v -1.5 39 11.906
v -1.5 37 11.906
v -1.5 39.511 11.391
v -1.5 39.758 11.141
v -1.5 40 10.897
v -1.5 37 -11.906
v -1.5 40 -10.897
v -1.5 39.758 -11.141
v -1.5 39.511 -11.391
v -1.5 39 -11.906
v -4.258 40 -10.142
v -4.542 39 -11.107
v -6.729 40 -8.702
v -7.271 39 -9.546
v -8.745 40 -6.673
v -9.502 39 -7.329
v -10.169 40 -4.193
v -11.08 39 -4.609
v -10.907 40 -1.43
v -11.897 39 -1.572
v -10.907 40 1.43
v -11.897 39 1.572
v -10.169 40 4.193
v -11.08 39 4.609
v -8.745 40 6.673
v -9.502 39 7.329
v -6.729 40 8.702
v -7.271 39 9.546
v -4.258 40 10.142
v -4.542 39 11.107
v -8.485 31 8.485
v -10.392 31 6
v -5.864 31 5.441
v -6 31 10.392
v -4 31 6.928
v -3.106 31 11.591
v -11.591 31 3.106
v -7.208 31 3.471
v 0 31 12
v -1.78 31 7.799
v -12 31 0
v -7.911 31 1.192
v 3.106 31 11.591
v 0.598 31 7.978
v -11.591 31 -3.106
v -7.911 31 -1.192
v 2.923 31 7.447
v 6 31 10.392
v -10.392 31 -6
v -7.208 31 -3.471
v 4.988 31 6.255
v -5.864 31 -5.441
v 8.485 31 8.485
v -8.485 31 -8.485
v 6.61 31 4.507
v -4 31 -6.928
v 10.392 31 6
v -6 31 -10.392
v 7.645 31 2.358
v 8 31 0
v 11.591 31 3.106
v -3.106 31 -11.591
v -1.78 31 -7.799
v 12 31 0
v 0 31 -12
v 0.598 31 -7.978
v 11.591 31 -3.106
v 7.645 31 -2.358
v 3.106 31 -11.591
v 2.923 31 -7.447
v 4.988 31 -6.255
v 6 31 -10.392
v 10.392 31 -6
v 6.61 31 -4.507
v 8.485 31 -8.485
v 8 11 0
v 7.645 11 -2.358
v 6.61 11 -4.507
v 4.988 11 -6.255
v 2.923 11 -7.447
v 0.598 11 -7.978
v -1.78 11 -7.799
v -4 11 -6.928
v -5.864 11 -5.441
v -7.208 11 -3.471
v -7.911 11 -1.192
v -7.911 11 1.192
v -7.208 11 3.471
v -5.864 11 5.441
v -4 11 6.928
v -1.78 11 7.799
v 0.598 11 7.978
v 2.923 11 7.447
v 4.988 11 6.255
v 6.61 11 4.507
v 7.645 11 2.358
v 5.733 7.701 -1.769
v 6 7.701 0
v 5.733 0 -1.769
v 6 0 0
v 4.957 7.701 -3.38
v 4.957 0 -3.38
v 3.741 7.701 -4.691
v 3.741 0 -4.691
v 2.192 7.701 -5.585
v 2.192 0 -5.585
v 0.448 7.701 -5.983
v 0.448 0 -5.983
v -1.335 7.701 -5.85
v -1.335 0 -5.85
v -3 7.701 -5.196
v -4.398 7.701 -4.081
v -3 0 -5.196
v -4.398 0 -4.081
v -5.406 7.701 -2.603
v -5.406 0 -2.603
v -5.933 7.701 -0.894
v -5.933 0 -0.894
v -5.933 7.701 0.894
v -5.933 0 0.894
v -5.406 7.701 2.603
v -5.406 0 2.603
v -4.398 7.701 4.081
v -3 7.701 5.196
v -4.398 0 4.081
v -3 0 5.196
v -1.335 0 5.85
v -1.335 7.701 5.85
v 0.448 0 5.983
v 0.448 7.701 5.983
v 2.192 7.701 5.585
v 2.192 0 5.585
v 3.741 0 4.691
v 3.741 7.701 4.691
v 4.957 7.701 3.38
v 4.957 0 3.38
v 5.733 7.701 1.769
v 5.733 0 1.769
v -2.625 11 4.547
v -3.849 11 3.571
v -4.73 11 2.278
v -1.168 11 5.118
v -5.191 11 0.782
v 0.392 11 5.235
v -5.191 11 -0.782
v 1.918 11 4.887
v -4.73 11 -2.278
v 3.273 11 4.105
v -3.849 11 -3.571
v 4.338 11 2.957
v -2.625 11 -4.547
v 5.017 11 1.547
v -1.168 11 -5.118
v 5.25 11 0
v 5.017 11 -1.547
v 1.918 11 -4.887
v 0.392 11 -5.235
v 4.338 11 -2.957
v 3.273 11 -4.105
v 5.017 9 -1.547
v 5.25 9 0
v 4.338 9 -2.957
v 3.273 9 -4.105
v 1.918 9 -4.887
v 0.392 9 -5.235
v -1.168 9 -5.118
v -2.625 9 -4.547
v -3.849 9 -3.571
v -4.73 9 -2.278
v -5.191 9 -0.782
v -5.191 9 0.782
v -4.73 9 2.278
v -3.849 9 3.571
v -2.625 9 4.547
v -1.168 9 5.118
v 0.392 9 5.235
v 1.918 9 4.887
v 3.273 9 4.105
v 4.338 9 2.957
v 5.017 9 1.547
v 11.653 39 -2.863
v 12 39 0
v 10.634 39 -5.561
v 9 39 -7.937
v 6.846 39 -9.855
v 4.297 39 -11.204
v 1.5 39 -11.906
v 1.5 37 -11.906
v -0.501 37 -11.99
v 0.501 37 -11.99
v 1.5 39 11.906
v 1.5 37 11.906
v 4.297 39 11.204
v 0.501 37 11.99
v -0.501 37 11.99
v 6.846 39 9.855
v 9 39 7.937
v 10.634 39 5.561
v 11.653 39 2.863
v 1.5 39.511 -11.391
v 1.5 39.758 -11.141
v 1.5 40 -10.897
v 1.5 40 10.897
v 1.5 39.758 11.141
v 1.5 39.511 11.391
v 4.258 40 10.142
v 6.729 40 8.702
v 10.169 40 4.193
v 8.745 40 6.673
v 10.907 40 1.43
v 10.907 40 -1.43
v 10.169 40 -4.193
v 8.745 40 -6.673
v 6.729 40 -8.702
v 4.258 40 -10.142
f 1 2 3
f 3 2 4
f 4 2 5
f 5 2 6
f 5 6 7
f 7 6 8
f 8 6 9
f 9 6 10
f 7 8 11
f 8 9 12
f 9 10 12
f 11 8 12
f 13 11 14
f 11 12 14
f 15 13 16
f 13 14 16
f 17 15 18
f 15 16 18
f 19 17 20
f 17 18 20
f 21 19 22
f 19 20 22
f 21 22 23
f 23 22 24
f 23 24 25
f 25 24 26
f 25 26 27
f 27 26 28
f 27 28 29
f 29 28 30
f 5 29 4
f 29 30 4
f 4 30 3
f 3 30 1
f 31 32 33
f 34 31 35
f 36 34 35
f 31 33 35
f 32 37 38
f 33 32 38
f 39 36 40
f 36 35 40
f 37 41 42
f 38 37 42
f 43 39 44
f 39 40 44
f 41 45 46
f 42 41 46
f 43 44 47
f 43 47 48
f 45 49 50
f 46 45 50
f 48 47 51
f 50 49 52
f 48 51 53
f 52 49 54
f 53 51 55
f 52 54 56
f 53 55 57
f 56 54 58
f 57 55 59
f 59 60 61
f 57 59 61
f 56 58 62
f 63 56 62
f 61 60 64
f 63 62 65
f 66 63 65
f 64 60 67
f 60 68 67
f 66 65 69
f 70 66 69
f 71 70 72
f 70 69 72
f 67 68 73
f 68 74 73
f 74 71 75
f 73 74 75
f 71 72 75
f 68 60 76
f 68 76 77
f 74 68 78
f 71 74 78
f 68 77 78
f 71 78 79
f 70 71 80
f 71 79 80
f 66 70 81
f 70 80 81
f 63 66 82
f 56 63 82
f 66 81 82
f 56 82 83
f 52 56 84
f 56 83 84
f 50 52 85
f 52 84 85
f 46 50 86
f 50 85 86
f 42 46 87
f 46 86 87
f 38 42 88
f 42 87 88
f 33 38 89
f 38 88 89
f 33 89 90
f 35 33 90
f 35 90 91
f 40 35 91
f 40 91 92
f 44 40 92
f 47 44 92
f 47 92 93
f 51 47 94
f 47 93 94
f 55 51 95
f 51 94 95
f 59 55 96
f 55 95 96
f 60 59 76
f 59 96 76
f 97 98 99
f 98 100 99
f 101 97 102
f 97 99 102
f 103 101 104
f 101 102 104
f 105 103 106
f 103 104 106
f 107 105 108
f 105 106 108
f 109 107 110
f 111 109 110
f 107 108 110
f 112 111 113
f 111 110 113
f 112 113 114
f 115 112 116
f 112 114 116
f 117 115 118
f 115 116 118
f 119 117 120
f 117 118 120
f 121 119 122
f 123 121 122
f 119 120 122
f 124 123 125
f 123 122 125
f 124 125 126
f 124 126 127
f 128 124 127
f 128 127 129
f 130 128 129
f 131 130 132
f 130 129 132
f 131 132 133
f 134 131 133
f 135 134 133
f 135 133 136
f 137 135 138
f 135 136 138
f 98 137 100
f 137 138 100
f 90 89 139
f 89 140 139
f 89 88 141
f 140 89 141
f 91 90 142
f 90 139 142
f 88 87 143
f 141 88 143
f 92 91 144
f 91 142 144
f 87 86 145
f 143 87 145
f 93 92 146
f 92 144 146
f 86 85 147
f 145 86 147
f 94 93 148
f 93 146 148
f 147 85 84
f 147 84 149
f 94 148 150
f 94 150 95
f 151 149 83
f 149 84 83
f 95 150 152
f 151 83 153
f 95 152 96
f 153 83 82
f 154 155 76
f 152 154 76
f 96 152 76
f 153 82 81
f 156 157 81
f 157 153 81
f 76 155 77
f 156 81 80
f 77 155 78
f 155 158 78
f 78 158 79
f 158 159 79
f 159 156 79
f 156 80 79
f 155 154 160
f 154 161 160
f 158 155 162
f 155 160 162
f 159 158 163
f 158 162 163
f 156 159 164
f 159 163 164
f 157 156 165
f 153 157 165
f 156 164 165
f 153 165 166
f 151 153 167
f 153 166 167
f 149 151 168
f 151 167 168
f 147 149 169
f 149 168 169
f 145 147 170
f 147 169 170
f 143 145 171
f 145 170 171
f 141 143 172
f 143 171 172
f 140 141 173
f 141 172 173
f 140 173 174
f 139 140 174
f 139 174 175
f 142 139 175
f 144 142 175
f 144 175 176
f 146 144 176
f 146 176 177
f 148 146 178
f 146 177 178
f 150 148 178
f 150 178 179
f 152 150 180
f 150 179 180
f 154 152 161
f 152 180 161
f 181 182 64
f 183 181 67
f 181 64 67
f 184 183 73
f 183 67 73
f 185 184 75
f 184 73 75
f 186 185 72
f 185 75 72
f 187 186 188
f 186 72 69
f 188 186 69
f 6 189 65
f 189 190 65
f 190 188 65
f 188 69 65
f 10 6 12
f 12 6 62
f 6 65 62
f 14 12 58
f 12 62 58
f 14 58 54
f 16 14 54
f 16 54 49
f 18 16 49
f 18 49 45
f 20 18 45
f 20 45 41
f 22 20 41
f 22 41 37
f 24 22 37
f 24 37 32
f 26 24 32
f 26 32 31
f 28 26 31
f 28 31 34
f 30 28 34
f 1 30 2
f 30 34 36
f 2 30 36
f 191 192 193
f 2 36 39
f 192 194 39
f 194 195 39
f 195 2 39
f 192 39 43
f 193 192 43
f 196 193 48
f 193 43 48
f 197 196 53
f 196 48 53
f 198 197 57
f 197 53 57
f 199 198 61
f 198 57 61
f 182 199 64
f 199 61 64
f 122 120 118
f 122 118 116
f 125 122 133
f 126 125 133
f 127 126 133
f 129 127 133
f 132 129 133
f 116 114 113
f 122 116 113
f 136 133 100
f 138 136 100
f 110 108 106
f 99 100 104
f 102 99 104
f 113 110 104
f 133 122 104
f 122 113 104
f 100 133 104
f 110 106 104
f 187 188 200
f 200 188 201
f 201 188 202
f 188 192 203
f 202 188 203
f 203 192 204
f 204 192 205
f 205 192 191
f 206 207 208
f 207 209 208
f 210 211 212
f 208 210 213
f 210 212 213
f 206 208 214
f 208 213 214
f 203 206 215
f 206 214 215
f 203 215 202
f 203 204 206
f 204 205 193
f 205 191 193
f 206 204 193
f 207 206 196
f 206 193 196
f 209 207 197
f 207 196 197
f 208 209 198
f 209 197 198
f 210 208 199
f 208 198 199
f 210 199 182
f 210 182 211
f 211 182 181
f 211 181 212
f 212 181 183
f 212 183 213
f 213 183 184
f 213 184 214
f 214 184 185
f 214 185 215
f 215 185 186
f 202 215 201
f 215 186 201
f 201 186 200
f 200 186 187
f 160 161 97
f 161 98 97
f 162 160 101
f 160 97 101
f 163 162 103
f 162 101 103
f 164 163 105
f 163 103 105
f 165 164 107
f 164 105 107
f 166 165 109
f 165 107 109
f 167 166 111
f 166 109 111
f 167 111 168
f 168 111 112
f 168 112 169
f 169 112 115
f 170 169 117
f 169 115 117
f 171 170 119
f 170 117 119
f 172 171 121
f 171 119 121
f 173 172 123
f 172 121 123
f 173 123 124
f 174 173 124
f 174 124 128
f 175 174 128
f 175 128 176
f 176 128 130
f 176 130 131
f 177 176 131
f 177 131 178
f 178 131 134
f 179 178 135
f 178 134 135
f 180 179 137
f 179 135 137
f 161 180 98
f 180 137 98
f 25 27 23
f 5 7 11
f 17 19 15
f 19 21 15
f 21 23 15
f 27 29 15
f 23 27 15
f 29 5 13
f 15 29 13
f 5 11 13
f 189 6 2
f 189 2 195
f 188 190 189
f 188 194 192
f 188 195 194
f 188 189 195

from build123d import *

# Parameters (mm, degrees)
SKETCH2_W               = 3
SKETCH2_H               = 3
CUT_EXTRUDE1_DEPTH      = 13
CUT_EXTRUDE1_DEPTH_BACK = 13
CHAMFER1_SIZE           = 1


with BuildPart() as part:
    # Sketch1 → Revolve1 (revolve)
    with BuildSketch(Plane.XY):
        Polygon((0, 40), (12, 40), (12, 31), (8, 31), (8, 11), (5.25, 11), (5.25, 9), (6, 7.700961894), (6, 0), (0, 0), align=None)
    revolve(axis=Axis((0, 0, 0), (0, 1, 0)))

    # Sketch2 → Cut-Extrude1 (cut, two sides)
    with BuildSketch(Plane.XY) as cut_extrude1_sk:
        with Locations((0, 38.5)):
            Rectangle(SKETCH2_W, SKETCH2_H)
    extrude(amount=CUT_EXTRUDE1_DEPTH, mode=Mode.SUBTRACT)
    extrude(cut_extrude1_sk.sketch, amount=-CUT_EXTRUDE1_DEPTH_BACK, mode=Mode.SUBTRACT)

    # Chamfer1
    chamfer1_edges = [part.edges().sort_by_distance(p)[0] for p in [
        (9, 40, -7.937253933),
        (-12, 40, 0),
    ]]
    chamfer(chamfer1_edges, length=CHAMFER1_SIZE)


solid = part.part
